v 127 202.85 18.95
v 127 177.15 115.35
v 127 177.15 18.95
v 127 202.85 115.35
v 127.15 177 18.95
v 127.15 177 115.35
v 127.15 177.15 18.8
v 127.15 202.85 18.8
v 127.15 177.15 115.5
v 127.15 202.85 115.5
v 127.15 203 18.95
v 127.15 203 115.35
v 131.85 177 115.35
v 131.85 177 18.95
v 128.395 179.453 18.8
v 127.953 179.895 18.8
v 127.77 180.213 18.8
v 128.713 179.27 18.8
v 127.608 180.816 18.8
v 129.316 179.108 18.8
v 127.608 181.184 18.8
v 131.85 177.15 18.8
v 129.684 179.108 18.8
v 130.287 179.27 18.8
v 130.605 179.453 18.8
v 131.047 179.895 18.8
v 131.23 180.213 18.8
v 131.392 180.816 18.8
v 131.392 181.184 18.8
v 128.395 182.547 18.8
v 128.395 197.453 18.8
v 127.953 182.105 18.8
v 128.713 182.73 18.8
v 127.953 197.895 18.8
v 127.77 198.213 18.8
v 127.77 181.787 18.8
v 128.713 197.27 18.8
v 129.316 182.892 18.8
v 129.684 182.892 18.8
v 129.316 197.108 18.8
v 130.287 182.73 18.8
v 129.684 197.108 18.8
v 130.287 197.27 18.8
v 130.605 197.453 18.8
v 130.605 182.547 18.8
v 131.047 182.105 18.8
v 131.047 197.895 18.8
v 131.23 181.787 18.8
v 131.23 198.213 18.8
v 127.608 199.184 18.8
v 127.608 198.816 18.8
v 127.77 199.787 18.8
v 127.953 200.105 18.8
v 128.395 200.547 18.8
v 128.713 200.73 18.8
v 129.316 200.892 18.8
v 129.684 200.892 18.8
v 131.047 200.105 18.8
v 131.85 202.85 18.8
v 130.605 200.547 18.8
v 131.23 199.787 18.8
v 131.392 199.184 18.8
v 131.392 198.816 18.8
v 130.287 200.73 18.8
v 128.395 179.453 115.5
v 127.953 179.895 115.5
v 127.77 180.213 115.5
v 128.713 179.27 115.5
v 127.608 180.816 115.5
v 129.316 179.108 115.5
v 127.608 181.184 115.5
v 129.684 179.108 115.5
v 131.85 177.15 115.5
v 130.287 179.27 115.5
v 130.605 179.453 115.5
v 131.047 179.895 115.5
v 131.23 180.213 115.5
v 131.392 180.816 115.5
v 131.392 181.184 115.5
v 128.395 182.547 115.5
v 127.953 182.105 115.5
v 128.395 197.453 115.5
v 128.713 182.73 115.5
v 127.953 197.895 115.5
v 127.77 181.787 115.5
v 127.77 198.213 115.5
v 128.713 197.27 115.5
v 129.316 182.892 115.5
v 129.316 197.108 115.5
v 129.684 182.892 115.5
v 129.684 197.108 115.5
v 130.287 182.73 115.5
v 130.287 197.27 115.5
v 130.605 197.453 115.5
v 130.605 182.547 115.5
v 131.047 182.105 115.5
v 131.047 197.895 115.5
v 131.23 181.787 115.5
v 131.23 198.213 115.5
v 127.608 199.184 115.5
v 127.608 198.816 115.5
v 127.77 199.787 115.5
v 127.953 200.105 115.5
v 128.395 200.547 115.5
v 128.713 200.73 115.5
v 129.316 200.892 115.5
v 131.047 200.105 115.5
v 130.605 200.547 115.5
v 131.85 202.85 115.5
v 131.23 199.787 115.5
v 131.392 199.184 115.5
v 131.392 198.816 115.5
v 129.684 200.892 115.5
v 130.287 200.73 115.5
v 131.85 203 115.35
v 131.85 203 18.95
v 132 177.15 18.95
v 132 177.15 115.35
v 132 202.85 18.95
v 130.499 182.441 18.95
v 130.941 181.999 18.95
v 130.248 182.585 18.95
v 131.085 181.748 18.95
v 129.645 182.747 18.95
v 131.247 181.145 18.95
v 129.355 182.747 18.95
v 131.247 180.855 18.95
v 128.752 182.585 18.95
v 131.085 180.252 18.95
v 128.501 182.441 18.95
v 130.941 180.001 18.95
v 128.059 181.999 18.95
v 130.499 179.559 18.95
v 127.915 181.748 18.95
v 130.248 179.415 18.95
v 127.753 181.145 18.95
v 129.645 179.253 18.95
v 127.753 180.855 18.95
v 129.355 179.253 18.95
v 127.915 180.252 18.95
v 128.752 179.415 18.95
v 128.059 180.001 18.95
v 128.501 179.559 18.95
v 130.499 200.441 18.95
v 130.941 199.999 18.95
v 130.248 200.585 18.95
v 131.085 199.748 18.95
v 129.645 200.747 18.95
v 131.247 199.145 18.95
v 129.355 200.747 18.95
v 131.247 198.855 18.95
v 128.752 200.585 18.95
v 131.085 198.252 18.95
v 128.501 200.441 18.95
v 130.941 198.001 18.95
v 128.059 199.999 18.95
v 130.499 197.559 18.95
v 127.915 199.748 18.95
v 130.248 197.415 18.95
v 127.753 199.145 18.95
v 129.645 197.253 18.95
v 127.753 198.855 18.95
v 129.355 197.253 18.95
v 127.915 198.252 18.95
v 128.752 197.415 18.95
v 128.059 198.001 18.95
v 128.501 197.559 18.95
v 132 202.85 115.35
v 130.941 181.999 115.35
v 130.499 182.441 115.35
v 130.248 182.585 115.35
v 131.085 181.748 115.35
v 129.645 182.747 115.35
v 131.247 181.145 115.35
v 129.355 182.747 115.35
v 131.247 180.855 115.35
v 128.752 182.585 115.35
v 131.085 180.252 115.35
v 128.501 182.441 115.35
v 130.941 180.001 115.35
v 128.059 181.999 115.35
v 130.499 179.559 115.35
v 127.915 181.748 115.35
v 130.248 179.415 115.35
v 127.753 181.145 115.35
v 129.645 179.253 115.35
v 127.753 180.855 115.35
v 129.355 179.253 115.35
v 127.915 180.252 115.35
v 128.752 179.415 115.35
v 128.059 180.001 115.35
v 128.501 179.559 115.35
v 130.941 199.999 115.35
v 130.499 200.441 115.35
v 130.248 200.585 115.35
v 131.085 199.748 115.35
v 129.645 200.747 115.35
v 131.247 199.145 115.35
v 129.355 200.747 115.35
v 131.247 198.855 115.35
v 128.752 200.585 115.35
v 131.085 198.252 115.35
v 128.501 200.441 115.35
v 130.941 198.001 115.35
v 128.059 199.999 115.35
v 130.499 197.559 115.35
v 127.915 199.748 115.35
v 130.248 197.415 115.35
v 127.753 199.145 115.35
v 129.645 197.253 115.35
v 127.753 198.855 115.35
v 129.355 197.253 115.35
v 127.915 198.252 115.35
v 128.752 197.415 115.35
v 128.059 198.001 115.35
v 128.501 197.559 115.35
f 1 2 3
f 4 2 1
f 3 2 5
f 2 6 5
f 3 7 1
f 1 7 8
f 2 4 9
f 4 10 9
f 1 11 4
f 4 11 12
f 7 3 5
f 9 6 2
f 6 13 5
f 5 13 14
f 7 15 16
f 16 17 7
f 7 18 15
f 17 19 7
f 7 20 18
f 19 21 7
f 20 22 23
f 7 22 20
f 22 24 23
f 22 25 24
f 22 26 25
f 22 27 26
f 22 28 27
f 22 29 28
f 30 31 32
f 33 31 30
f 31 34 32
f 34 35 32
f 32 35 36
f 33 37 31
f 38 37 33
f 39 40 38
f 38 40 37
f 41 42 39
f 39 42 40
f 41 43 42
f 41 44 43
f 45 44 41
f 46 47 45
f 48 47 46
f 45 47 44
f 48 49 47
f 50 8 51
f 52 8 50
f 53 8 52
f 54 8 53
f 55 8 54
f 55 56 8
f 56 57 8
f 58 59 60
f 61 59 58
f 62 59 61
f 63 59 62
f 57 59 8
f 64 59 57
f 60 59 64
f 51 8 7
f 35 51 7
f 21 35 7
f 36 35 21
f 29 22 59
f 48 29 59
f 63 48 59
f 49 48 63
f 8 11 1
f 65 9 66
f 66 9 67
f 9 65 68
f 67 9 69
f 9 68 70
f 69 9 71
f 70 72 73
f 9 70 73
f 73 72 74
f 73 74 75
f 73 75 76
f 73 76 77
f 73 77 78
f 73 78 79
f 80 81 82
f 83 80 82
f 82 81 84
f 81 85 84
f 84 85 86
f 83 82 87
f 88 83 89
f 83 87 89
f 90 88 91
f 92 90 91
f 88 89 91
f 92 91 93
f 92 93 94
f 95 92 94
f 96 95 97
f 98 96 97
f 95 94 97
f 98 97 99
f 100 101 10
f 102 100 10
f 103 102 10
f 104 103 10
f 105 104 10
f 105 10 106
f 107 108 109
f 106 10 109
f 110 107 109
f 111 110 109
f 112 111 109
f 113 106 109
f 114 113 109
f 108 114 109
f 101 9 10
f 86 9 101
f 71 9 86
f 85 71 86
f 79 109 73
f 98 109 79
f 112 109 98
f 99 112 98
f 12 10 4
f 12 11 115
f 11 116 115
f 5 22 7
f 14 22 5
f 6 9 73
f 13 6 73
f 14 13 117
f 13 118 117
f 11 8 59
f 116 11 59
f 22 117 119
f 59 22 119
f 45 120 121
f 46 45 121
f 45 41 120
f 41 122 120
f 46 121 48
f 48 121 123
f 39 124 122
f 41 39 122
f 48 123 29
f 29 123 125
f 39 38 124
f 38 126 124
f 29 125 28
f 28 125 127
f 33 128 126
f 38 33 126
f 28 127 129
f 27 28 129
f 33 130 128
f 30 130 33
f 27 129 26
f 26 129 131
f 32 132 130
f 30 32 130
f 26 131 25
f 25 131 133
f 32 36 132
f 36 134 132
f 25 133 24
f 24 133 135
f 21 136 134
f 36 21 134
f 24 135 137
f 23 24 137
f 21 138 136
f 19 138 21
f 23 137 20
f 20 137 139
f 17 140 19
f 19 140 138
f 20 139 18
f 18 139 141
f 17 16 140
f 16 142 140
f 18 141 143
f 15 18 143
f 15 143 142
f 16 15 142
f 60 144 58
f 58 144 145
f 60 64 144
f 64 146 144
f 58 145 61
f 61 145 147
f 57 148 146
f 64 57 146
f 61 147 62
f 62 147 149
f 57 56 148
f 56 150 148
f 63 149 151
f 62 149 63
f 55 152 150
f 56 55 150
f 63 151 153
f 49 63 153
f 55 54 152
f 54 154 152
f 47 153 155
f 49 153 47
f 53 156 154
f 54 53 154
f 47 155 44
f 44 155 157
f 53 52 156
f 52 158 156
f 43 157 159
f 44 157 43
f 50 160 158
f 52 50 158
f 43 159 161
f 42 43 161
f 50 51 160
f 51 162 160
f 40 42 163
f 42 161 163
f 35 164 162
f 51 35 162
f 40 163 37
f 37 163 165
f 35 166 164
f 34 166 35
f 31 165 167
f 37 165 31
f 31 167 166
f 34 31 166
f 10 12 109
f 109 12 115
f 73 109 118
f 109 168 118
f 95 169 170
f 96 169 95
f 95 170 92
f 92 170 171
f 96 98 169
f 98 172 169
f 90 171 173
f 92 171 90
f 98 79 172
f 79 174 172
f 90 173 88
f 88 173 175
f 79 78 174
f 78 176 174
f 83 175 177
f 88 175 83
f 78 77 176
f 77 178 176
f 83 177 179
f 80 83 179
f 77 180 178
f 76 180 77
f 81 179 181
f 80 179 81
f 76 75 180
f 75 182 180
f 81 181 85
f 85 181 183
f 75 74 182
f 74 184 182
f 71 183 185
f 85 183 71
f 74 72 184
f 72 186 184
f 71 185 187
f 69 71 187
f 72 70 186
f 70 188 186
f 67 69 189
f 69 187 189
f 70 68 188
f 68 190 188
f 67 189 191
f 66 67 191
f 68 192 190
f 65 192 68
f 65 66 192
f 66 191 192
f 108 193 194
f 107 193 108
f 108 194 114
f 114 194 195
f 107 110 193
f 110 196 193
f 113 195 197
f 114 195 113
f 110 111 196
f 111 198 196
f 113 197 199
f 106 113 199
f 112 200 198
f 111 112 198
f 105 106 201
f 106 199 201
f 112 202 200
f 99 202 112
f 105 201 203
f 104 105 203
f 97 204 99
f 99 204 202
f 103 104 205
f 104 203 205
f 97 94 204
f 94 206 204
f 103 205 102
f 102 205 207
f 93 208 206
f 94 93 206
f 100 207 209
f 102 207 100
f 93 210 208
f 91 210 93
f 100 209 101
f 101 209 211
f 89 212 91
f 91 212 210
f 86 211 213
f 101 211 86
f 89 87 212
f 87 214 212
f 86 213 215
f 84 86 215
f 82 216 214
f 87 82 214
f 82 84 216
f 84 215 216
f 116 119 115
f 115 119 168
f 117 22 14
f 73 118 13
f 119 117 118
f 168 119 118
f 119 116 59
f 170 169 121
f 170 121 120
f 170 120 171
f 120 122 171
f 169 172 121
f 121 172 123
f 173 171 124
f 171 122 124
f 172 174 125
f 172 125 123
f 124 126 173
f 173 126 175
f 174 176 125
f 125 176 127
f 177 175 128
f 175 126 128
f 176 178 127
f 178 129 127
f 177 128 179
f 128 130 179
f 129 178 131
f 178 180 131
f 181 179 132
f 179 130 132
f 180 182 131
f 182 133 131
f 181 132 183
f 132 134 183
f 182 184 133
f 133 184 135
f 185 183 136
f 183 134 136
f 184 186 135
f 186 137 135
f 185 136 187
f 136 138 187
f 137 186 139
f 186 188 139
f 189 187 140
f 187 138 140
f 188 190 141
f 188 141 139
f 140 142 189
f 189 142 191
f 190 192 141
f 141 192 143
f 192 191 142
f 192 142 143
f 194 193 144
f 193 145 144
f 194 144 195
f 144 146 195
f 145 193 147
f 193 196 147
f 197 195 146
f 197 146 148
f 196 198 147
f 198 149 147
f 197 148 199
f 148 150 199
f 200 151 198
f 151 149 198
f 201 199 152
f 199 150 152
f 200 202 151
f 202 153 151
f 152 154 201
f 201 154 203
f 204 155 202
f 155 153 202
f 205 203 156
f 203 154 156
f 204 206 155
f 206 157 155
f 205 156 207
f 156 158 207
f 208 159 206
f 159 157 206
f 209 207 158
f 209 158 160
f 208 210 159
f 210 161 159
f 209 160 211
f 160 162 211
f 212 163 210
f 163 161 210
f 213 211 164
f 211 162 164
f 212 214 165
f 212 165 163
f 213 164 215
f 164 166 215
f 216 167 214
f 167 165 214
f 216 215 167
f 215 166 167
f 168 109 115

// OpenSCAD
// Generated from the same CSG operations as STEP. Rebuild with spec/build_parent_hand_service.py.
polyhedron(points=[[127.0, 177.14999389648438, 18.950000762939453], [127.0, 177.14999389648438, 115.3499984741211], [127.0, 202.85000610351562, 18.950000762939453], [127.0, 202.85000610351562, 115.3499984741211], [127.1500015258789, 177.0, 18.950000762939453], [127.1500015258789, 177.0, 115.3499984741211], [127.1500015258789, 177.14999389648438, 18.799999237060547], [127.1500015258789, 202.85000610351562, 18.799999237060547], [127.1500015258789, 177.14999389648438, 115.5], [127.1500015258789, 202.85000610351562, 115.5], [127.1500015258789, 203.0, 18.950000762939453], [127.1500015258789, 203.0, 115.3499984741211], [131.85000610351562, 177.0, 115.3499984741211], [131.85000610351562, 177.0, 18.950000762939453], [127.95340728759766, 179.8949432373047, 18.799999237060547], [128.3949432373047, 179.4534149169922, 18.799999237060547], [127.76969909667969, 180.213134765625, 18.799999237060547], [128.713134765625, 179.2696990966797, 18.799999237060547], [127.60808563232422, 180.8162841796875, 18.799999237060547], [129.3162841796875, 179.1080780029297, 18.799999237060547], [127.60808563232422, 181.1837158203125, 18.799999237060547], [129.6837158203125, 179.1080780029297, 18.799999237060547], [131.85000610351562, 177.14999389648438, 18.799999237060547], [130.286865234375, 179.2696990966797, 18.799999237060547], [130.6050567626953, 179.4534149169922, 18.799999237060547], [131.0465850830078, 179.8949432373047, 18.799999237060547], [131.2303009033203, 180.213134765625, 18.799999237060547], [131.3919219970703, 180.8162841796875, 18.799999237060547], [131.3919219970703, 181.1837158203125, 18.799999237060547], [127.95340728759766, 182.1050567626953, 18.799999237060547], [128.3949432373047, 197.4534149169922, 18.799999237060547], [128.3949432373047, 182.5465850830078, 18.799999237060547], [128.713134765625, 182.7303009033203, 18.799999237060547], [127.95340728759766, 197.8949432373047, 18.799999237060547], [127.76969909667969, 198.213134765625, 18.799999237060547], [127.76969909667969, 181.786865234375, 18.799999237060547], [128.713134765625, 197.2696990966797, 18.799999237060547], [129.3162841796875, 182.8919219970703, 18.799999237060547], [129.3162841796875, 197.1080780029297, 18.799999237060547], [129.6837158203125, 182.8919219970703, 18.799999237060547], [129.6837158203125, 197.1080780029297, 18.799999237060547], [130.286865234375, 182.7303009033203, 18.799999237060547], [130.286865234375, 197.2696990966797, 18.799999237060547], [130.6050567626953, 197.4534149169922, 18.799999237060547], [130.6050567626953, 182.5465850830078, 18.799999237060547], [131.0465850830078, 197.8949432373047, 18.799999237060547], [131.0465850830078, 182.1050567626953, 18.799999237060547], [131.2303009033203, 181.786865234375, 18.799999237060547], [131.2303009033203, 198.213134765625, 18.799999237060547], [127.60808563232422, 198.8162841796875, 18.799999237060547], [127.60808563232422, 199.1837158203125, 18.799999237060547], [127.76969909667969, 199.786865234375, 18.799999237060547], [127.95340728759766, 200.1050567626953, 18.799999237060547], [128.3949432373047, 200.5465850830078, 18.799999237060547], [128.713134765625, 200.7303009033203, 18.799999237060547], [129.3162841796875, 200.8919219970703, 18.799999237060547], [129.6837158203125, 200.8919219970703, 18.799999237060547], [130.6050567626953, 200.5465850830078, 18.799999237060547], [131.85000610351562, 202.85000610351562, 18.799999237060547], [131.0465850830078, 200.1050567626953, 18.799999237060547], [131.2303009033203, 199.786865234375, 18.799999237060547], [131.3919219970703, 199.1837158203125, 18.799999237060547], [131.3919219970703, 198.8162841796875, 18.799999237060547], [130.286865234375, 200.7303009033203, 18.799999237060547], [127.95340728759766, 179.8949432373047, 115.5], [128.3949432373047, 179.4534149169922, 115.5], [127.76969909667969, 180.213134765625, 115.5], [128.713134765625, 179.2696990966797, 115.5], [127.60808563232422, 180.8162841796875, 115.5], [129.3162841796875, 179.1080780029297, 115.5], [127.60808563232422, 181.1837158203125, 115.5], [131.85000610351562, 177.14999389648438, 115.5], [129.6837158203125, 179.1080780029297, 115.5], [130.286865234375, 179.2696990966797, 115.5], [130.6050567626953, 179.4534149169922, 115.5], [131.0465850830078, 179.8949432373047, 115.5], [131.2303009033203, 180.213134765625, 115.5], [131.3919219970703, 180.8162841796875, 115.5], [131.3919219970703, 181.1837158203125, 115.5], [128.3949432373047, 197.4534149169922, 115.5], [127.95340728759766, 182.1050567626953, 115.5], [128.3949432373047, 182.5465850830078, 115.5], [128.713134765625, 182.7303009033203, 115.5], [127.95340728759766, 197.8949432373047, 115.5], [127.76969909667969, 181.786865234375, 115.5], [127.76969909667969, 198.213134765625, 115.5], [128.713134765625, 197.2696990966797, 115.5], [129.3162841796875, 197.1080780029297, 115.5], [129.3162841796875, 182.8919219970703, 115.5], [129.6837158203125, 197.1080780029297, 115.5], [129.6837158203125, 182.8919219970703, 115.5], [130.286865234375, 182.7303009033203, 115.5], [130.286865234375, 197.2696990966797, 115.5], [130.6050567626953, 197.4534149169922, 115.5], [130.6050567626953, 182.5465850830078, 115.5], [131.0465850830078, 197.8949432373047, 115.5], [131.0465850830078, 182.1050567626953, 115.5], [131.2303009033203, 181.786865234375, 115.5], [131.2303009033203, 198.213134765625, 115.5], [127.60808563232422, 198.8162841796875, 115.5], [127.60808563232422, 199.1837158203125, 115.5], [127.76969909667969, 199.786865234375, 115.5], [127.95340728759766, 200.1050567626953, 115.5], [128.3949432373047, 200.5465850830078, 115.5], [128.713134765625, 200.7303009033203, 115.5], [129.3162841796875, 200.8919219970703, 115.5], [131.85000610351562, 202.85000610351562, 115.5], [130.6050567626953, 200.5465850830078, 115.5], [131.0465850830078, 200.1050567626953, 115.5], [131.2303009033203, 199.786865234375, 115.5], [131.3919219970703, 199.1837158203125, 115.5], [131.3919219970703, 198.8162841796875, 115.5], [129.6837158203125, 200.8919219970703, 115.5], [130.286865234375, 200.7303009033203, 115.5], [131.85000610351562, 203.0, 115.3499984741211], [131.85000610351562, 203.0, 18.950000762939453], [132.0, 177.14999389648438, 18.950000762939453], [132.0, 177.14999389648438, 115.3499984741211], [132.0, 202.85000610351562, 18.950000762939453], [130.94052124023438, 181.99899291992188, 18.950000762939453], [130.49899291992188, 182.44052124023438, 18.950000762939453], [130.24803161621094, 182.58541870117188, 18.950000762939453], [131.08541870117188, 181.74803161621094, 18.950000762939453], [129.64488220214844, 182.7470245361328, 18.950000762939453], [131.2470245361328, 181.14488220214844, 18.950000762939453], [129.35511779785156, 182.7470245361328, 18.950000762939453], [131.2470245361328, 180.85511779785156, 18.950000762939453], [128.75196838378906, 182.58541870117188, 18.950000762939453], [131.08541870117188, 180.25196838378906, 18.950000762939453], [128.50100708007812, 182.44052124023438, 18.950000762939453], [130.94052124023438, 180.00100708007812, 18.950000762939453], [128.05947875976562, 181.99899291992188, 18.950000762939453], [130.49899291992188, 179.55947875976562, 18.950000762939453], [127.91458129882812, 181.74803161621094, 18.950000762939453], [130.24803161621094, 179.41458129882812, 18.950000762939453], [127.75296783447266, 181.14488220214844, 18.950000762939453], [129.64488220214844, 179.2529754638672, 18.950000762939453], [127.75296783447266, 180.85511779785156, 18.950000762939453], [129.35511779785156, 179.2529754638672, 18.950000762939453], [127.91458129882812, 180.25196838378906, 18.950000762939453], [128.75196838378906, 179.41458129882812, 18.950000762939453], [128.05947875976562, 180.00100708007812, 18.950000762939453], [128.50100708007812, 179.55947875976562, 18.950000762939453], [130.49899291992188, 200.44052124023438, 18.950000762939453], [130.94052124023438, 199.99899291992188, 18.950000762939453], [130.24803161621094, 200.58541870117188, 18.950000762939453], [131.08541870117188, 199.74803161621094, 18.950000762939453], [129.64488220214844, 200.7470245361328, 18.950000762939453], [131.2470245361328, 199.14488220214844, 18.950000762939453], [129.35511779785156, 200.7470245361328, 18.950000762939453], [131.2470245361328, 198.85511779785156, 18.950000762939453], [128.75196838378906, 200.58541870117188, 18.950000762939453], [131.08541870117188, 198.25196838378906, 18.950000762939453], [128.50100708007812, 200.44052124023438, 18.950000762939453], [130.94052124023438, 198.00100708007812, 18.950000762939453], [128.05947875976562, 199.99899291992188, 18.950000762939453], [130.49899291992188, 197.55947875976562, 18.950000762939453], [127.91458129882812, 199.74803161621094, 18.950000762939453], [130.24803161621094, 197.41458129882812, 18.950000762939453], [127.75296783447266, 199.14488220214844, 18.950000762939453], [129.64488220214844, 197.2529754638672, 18.950000762939453], [127.75296783447266, 198.85511779785156, 18.950000762939453], [129.35511779785156, 197.2529754638672, 18.950000762939453], [127.91458129882812, 198.25196838378906, 18.950000762939453], [128.75196838378906, 197.41458129882812, 18.950000762939453], [128.05947875976562, 198.00100708007812, 18.950000762939453], [128.50100708007812, 197.55947875976562, 18.950000762939453], [132.0, 202.85000610351562, 115.3499984741211], [130.49899291992188, 182.44052124023438, 115.3499984741211], [130.94052124023438, 181.99899291992188, 115.3499984741211], [130.24803161621094, 182.58541870117188, 115.3499984741211], [131.08541870117188, 181.74803161621094, 115.3499984741211], [129.64488220214844, 182.7470245361328, 115.3499984741211], [131.2470245361328, 181.14488220214844, 115.3499984741211], [129.35511779785156, 182.7470245361328, 115.3499984741211], [131.2470245361328, 180.85511779785156, 115.3499984741211], [128.75196838378906, 182.58541870117188, 115.3499984741211], [131.08541870117188, 180.25196838378906, 115.3499984741211], [128.50100708007812, 182.44052124023438, 115.3499984741211], [130.94052124023438, 180.00100708007812, 115.3499984741211], [128.05947875976562, 181.99899291992188, 115.3499984741211], [130.49899291992188, 179.55947875976562, 115.3499984741211], [127.91458129882812, 181.74803161621094, 115.3499984741211], [130.24803161621094, 179.41458129882812, 115.3499984741211], [127.75296783447266, 181.14488220214844, 115.3499984741211], [129.64488220214844, 179.2529754638672, 115.3499984741211], [127.75296783447266, 180.85511779785156, 115.3499984741211], [129.35511779785156, 179.2529754638672, 115.3499984741211], [127.91458129882812, 180.25196838378906, 115.3499984741211], [128.75196838378906, 179.41458129882812, 115.3499984741211], [128.05947875976562, 180.00100708007812, 115.3499984741211], [128.50100708007812, 179.55947875976562, 115.3499984741211], [130.49899291992188, 200.44052124023438, 115.3499984741211], [130.94052124023438, 199.99899291992188, 115.3499984741211], [130.24803161621094, 200.58541870117188, 115.3499984741211], [131.08541870117188, 199.74803161621094, 115.3499984741211], [129.64488220214844, 200.7470245361328, 115.3499984741211], [131.2470245361328, 199.14488220214844, 115.3499984741211], [129.35511779785156, 200.7470245361328, 115.3499984741211], [131.2470245361328, 198.85511779785156, 115.3499984741211], [128.75196838378906, 200.58541870117188, 115.3499984741211], [131.08541870117188, 198.25196838378906, 115.3499984741211], [128.50100708007812, 200.44052124023438, 115.3499984741211], [130.94052124023438, 198.00100708007812, 115.3499984741211], [128.05947875976562, 199.99899291992188, 115.3499984741211], [130.49899291992188, 197.55947875976562, 115.3499984741211], [127.91458129882812, 199.74803161621094, 115.3499984741211], [130.24803161621094, 197.41458129882812, 115.3499984741211], [127.75296783447266, 199.14488220214844, 115.3499984741211], [129.64488220214844, 197.2529754638672, 115.3499984741211], [127.75296783447266, 198.85511779785156, 115.3499984741211], [129.35511779785156, 197.2529754638672, 115.3499984741211], [127.91458129882812, 198.25196838378906, 115.3499984741211], [128.75196838378906, 197.41458129882812, 115.3499984741211], [128.05947875976562, 198.00100708007812, 115.3499984741211], [128.50100708007812, 197.55947875976562, 115.3499984741211]],faces=[[0, 1, 2], [2, 1, 3], [4, 1, 0], [4, 5, 1], [2, 6, 0], [7, 6, 2], [8, 3, 1], [8, 9, 3], [3, 10, 2], [11, 10, 3], [4, 0, 6], [1, 5, 8], [4, 12, 5], [13, 12, 4], [14, 15, 6], [6, 16, 14], [15, 17, 6], [6, 18, 16], [17, 19, 6], [6, 20, 18], [21, 22, 19], [19, 22, 6], [21, 23, 22], [23, 24, 22], [24, 25, 22], [25, 26, 22], [26, 27, 22], [27, 28, 22], [29, 30, 31], [31, 30, 32], [29, 33, 30], [29, 34, 33], [35, 34, 29], [30, 36, 32], [32, 36, 37], [37, 38, 39], [36, 38, 37], [39, 40, 41], [38, 40, 39], [40, 42, 41], [42, 43, 41], [41, 43, 44], [44, 45, 46], [46, 45, 47], [43, 45, 44], [45, 48, 47], [49, 7, 50], [50, 7, 51], [51, 7, 52], [52, 7, 53], [53, 7, 54], [7, 55, 54], [7, 56, 55], [57, 58, 59], [59, 58, 60], [60, 58, 61], [61, 58, 62], [7, 58, 56], [56, 58, 63], [63, 58, 57], [6, 7, 49], [6, 49, 34], [6, 34, 20], [20, 34, 35], [58, 22, 28], [58, 28, 47], [58, 47, 62], [62, 47, 48], [2, 10, 7], [64, 8, 65], [66, 8, 64], [67, 65, 8], [68, 8, 66], [69, 67, 8], [70, 8, 68], [71, 72, 69], [71, 69, 8], [73, 72, 71], [74, 73, 71], [75, 74, 71], [76, 75, 71], [77, 76, 71], [78, 77, 71], [79, 80, 81], [79, 81, 82], [83, 80, 79], [83, 84, 80], [85, 84, 83], [86, 79, 82], [87, 82, 88], [87, 86, 82], [89, 88, 90], [89, 90, 91], [89, 87, 88], [92, 89, 91], [93, 92, 91], [93, 91, 94], [95, 94, 96], [95, 96, 97], [95, 93, 94], [98, 95, 97], [9, 99, 100], [9, 100, 101], [9, 101, 102], [9, 102, 103], [9, 103, 104], [105, 9, 104], [106, 107, 108], [106, 9, 105], [106, 108, 109], [106, 109, 110], [106, 110, 111], [106, 105, 112], [106, 112, 113], [106, 113, 107], [9, 8, 99], [99, 8, 85], [85, 8, 70], [85, 70, 84], [71, 106, 78], [78, 106, 97], [97, 106, 111], [97, 111, 98], [3, 9, 11], [114, 10, 11], [114, 115, 10], [6, 22, 4], [4, 22, 13], [71, 8, 5], [71, 5, 12], [116, 12, 13], [116, 117, 12], [58, 7, 10], [58, 10, 115], [118, 116, 22], [118, 22, 58], [119, 120, 44], [119, 44, 46], [120, 41, 44], [120, 121, 41], [47, 119, 46], [122, 119, 47], [121, 123, 39], [121, 39, 41], [28, 122, 47], [124, 122, 28], [123, 37, 39], [123, 125, 37], [27, 124, 28], [126, 124, 27], [125, 127, 32], [125, 32, 37], [128, 126, 27], [128, 27, 26], [127, 129, 32], [32, 129, 31], [25, 128, 26], [130, 128, 25], [129, 131, 29], [129, 29, 31], [24, 130, 25], [132, 130, 24], [131, 35, 29], [131, 133, 35], [23, 132, 24], [134, 132, 23], [133, 135, 20], [133, 20, 35], [136, 134, 23], [136, 23, 21], [135, 137, 20], [20, 137, 18], [19, 136, 21], [138, 136, 19], [18, 139, 16], [137, 139, 18], [17, 138, 19], [140, 138, 17], [139, 14, 16], [139, 141, 14], [142, 140, 17], [142, 17, 15], [141, 142, 15], [141, 15, 14], [59, 143, 57], [144, 143, 59], [143, 63, 57], [143, 145, 63], [60, 144, 59], [146, 144, 60], [145, 147, 56], [145, 56, 63], [61, 146, 60], [148, 146, 61], [147, 55, 56], [147, 149, 55], [150, 148, 62], [62, 148, 61], [149, 151, 54], [149, 54, 55], [152, 150, 62], [152, 62, 48], [151, 53, 54], [151, 153, 53], [154, 152, 45], [45, 152, 48], [153, 155, 52], [153, 52, 53], [43, 154, 45], [156, 154, 43], [155, 51, 52], [155, 157, 51], [158, 156, 42], [42, 156, 43], [157, 159, 50], [157, 50, 51], [160, 158, 42], [160, 42, 40], [159, 49, 50], [159, 161, 49], [162, 40, 38], [162, 160, 40], [161, 163, 34], [161, 34, 49], [36, 162, 38], [164, 162, 36], [163, 165, 34], [34, 165, 33], [166, 164, 30], [30, 164, 36], [165, 166, 30], [165, 30, 33], [106, 11, 9], [114, 11, 106], [117, 106, 71], [117, 167, 106], [168, 169, 94], [94, 169, 96], [91, 168, 94], [170, 168, 91], [169, 97, 96], [169, 171, 97], [172, 170, 90], [90, 170, 91], [171, 78, 97], [171, 173, 78], [88, 172, 90], [174, 172, 88], [173, 77, 78], [173, 175, 77], [176, 174, 82], [82, 174, 88], [175, 76, 77], [175, 177, 76], [178, 176, 82], [178, 82, 81], [177, 179, 76], [76, 179, 75], [180, 178, 80], [80, 178, 81], [179, 74, 75], [179, 181, 74], [84, 180, 80], [182, 180, 84], [181, 73, 74], [181, 183, 73], [184, 182, 70], [70, 182, 84], [183, 72, 73], [183, 185, 72], [186, 184, 70], [186, 70, 68], [185, 69, 72], [185, 187, 69], [188, 68, 66], [188, 186, 68], [187, 67, 69], [187, 189, 67], [190, 188, 66], [190, 66, 64], [189, 191, 67], [67, 191, 65], [191, 64, 65], [191, 190, 64], [192, 193, 107], [107, 193, 108], [113, 192, 107], [194, 192, 113], [193, 109, 108], [193, 195, 109], [196, 194, 112], [112, 194, 113], [195, 110, 109], [195, 197, 110], [198, 196, 112], [198, 112, 105], [197, 199, 111], [197, 111, 110], [200, 105, 104], [200, 198, 105], [199, 201, 111], [111, 201, 98], [202, 200, 104], [202, 104, 103], [98, 203, 95], [201, 203, 98], [204, 103, 102], [204, 202, 103], [203, 93, 95], [203, 205, 93], [101, 204, 102], [206, 204, 101], [205, 207, 92], [205, 92, 93], [208, 206, 100], [100, 206, 101], [207, 209, 92], [92, 209, 89], [99, 208, 100], [210, 208, 99], [89, 211, 87], [209, 211, 89], [212, 210, 85], [85, 210, 99], [211, 86, 87], [211, 213, 86], [214, 212, 85], [214, 85, 83], [213, 215, 79], [213, 79, 86], [215, 83, 79], [215, 214, 83], [114, 118, 115], [167, 118, 114], [13, 22, 116], [12, 117, 71], [117, 116, 118], [117, 118, 167], [58, 115, 118], [119, 169, 168], [120, 119, 168], [170, 120, 168], [170, 121, 120], [119, 171, 169], [122, 171, 119], [123, 170, 172], [123, 121, 170], [124, 173, 171], [122, 124, 171], [172, 125, 123], [174, 125, 172], [124, 175, 173], [126, 175, 124], [127, 174, 176], [127, 125, 174], [126, 177, 175], [126, 128, 177], [178, 127, 176], [178, 129, 127], [130, 177, 128], [130, 179, 177], [131, 178, 180], [131, 129, 178], [130, 181, 179], [130, 132, 181], [182, 131, 180], [182, 133, 131], [132, 183, 181], [134, 183, 132], [135, 182, 184], [135, 133, 182], [134, 185, 183], [134, 136, 185], [186, 135, 184], [186, 137, 135], [138, 185, 136], [138, 187, 185], [139, 186, 188], [139, 137, 186], [140, 189, 187], [138, 140, 187], [188, 141, 139], [190, 141, 188], [140, 191, 189], [142, 191, 140], [141, 190, 191], [142, 141, 191], [143, 193, 192], [143, 144, 193], [194, 143, 192], [194, 145, 143], [146, 193, 144], [146, 195, 193], [145, 194, 196], [147, 145, 196], [146, 197, 195], [146, 148, 197], [198, 147, 196], [198, 149, 147], [197, 150, 199], [197, 148, 150], [151, 198, 200], [151, 149, 198], [150, 201, 199], [150, 152, 201], [200, 153, 151], [202, 153, 200], [201, 154, 203], [201, 152, 154], [155, 202, 204], [155, 153, 202], [154, 205, 203], [154, 156, 205], [206, 155, 204], [206, 157, 155], [205, 158, 207], [205, 156, 158], [157, 206, 208], [159, 157, 208], [158, 209, 207], [158, 160, 209], [210, 159, 208], [210, 161, 159], [209, 162, 211], [209, 160, 162], [163, 210, 212], [163, 161, 210], [164, 213, 211], [162, 164, 211], [214, 163, 212], [214, 165, 163], [213, 166, 215], [213, 164, 166], [166, 214, 215], [166, 165, 214], [114, 106, 167]],convexity=10);
